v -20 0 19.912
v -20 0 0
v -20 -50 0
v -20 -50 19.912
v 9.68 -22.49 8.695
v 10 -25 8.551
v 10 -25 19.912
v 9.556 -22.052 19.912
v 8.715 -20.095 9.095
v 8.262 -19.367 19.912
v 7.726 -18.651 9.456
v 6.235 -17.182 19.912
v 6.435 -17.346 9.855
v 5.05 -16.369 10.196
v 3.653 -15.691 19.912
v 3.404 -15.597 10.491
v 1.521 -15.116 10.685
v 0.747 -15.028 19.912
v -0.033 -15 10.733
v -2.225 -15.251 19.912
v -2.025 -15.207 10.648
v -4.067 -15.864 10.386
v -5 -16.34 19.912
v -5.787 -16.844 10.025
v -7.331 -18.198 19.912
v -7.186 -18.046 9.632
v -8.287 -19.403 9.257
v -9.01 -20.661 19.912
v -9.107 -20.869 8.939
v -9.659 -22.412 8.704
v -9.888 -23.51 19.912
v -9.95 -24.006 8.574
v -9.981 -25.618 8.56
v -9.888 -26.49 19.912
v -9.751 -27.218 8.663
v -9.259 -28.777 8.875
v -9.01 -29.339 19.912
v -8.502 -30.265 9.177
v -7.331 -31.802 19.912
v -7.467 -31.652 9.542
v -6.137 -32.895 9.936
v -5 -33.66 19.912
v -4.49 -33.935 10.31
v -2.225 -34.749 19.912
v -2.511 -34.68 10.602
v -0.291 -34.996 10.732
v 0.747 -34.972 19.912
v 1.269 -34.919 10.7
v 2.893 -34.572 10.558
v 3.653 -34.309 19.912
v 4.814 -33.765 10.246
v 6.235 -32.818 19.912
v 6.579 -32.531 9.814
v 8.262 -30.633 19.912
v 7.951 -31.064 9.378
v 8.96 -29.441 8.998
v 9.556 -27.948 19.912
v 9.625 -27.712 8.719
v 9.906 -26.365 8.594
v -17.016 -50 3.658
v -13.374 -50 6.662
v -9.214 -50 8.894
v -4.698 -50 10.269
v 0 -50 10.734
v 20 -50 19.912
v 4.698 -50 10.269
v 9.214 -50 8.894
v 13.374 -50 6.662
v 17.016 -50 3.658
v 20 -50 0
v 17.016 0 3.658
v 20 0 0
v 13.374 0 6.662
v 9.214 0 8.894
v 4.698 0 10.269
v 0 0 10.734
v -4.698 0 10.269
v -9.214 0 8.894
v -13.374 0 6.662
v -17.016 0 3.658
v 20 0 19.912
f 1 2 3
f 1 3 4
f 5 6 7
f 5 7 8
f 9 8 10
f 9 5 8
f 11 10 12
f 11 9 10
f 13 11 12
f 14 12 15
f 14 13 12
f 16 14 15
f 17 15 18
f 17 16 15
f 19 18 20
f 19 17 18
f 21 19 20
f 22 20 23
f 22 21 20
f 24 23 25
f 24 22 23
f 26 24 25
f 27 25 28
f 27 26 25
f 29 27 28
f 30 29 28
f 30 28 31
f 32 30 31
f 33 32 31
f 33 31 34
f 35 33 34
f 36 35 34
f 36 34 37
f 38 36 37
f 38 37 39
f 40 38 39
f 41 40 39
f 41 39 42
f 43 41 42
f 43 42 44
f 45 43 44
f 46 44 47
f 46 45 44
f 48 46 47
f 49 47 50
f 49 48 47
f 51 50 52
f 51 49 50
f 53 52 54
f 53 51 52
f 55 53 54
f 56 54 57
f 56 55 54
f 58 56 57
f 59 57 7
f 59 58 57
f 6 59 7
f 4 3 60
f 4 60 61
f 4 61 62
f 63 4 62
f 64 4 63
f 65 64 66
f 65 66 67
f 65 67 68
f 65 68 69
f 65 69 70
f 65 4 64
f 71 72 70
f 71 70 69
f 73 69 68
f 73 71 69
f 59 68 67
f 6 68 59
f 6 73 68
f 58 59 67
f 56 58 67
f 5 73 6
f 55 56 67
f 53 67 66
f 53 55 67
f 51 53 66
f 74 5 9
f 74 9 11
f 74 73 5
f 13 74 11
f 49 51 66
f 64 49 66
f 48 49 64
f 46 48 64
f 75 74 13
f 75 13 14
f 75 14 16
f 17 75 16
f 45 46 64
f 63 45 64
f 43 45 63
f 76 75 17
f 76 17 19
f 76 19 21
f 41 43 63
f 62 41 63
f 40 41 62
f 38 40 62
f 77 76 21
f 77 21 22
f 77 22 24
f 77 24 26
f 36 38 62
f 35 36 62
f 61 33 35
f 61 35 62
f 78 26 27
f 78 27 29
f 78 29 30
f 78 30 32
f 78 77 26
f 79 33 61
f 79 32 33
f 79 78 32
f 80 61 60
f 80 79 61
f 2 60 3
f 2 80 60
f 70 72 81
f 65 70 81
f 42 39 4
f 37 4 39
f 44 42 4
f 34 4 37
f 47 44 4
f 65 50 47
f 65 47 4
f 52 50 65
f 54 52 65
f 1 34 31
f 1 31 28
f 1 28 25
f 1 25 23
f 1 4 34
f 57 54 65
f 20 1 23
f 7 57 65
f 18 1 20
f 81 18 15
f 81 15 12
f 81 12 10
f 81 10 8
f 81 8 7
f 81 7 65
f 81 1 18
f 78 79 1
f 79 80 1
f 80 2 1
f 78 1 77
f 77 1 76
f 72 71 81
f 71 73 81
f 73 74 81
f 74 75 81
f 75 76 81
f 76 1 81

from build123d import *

# Parameters (mm, degrees)
F0_W     = 40
F0_H     = 20
F1_DEPTH = 50
F2_R     = 24
F3_DEPTH = 50.001
F4_R     = 10
F5_DEPTH = 19.913378


with BuildPart() as f1:
    # F0 (on Front) → F1 (new body)
    with BuildSketch(Plane.XZ):
        with Locations((0, 9.912378)):
            Rectangle(F0_W, F0_H)
    extrude(amount=F1_DEPTH)

    # F2 (on Front) → F3 (cut, through all)
    with BuildSketch(Plane.XZ):
        with Locations((0, -13.266499)):
            Circle(F2_R)
    extrude(amount=F3_DEPTH, mode=Mode.SUBTRACT)

    # F4 (on Top) → F5 (cut, through all)
    with BuildSketch(Plane.XY):
        with Locations((0, -25)):
            Circle(F4_R)
    extrude(amount=F5_DEPTH, mode=Mode.SUBTRACT)


solid = f1.part
